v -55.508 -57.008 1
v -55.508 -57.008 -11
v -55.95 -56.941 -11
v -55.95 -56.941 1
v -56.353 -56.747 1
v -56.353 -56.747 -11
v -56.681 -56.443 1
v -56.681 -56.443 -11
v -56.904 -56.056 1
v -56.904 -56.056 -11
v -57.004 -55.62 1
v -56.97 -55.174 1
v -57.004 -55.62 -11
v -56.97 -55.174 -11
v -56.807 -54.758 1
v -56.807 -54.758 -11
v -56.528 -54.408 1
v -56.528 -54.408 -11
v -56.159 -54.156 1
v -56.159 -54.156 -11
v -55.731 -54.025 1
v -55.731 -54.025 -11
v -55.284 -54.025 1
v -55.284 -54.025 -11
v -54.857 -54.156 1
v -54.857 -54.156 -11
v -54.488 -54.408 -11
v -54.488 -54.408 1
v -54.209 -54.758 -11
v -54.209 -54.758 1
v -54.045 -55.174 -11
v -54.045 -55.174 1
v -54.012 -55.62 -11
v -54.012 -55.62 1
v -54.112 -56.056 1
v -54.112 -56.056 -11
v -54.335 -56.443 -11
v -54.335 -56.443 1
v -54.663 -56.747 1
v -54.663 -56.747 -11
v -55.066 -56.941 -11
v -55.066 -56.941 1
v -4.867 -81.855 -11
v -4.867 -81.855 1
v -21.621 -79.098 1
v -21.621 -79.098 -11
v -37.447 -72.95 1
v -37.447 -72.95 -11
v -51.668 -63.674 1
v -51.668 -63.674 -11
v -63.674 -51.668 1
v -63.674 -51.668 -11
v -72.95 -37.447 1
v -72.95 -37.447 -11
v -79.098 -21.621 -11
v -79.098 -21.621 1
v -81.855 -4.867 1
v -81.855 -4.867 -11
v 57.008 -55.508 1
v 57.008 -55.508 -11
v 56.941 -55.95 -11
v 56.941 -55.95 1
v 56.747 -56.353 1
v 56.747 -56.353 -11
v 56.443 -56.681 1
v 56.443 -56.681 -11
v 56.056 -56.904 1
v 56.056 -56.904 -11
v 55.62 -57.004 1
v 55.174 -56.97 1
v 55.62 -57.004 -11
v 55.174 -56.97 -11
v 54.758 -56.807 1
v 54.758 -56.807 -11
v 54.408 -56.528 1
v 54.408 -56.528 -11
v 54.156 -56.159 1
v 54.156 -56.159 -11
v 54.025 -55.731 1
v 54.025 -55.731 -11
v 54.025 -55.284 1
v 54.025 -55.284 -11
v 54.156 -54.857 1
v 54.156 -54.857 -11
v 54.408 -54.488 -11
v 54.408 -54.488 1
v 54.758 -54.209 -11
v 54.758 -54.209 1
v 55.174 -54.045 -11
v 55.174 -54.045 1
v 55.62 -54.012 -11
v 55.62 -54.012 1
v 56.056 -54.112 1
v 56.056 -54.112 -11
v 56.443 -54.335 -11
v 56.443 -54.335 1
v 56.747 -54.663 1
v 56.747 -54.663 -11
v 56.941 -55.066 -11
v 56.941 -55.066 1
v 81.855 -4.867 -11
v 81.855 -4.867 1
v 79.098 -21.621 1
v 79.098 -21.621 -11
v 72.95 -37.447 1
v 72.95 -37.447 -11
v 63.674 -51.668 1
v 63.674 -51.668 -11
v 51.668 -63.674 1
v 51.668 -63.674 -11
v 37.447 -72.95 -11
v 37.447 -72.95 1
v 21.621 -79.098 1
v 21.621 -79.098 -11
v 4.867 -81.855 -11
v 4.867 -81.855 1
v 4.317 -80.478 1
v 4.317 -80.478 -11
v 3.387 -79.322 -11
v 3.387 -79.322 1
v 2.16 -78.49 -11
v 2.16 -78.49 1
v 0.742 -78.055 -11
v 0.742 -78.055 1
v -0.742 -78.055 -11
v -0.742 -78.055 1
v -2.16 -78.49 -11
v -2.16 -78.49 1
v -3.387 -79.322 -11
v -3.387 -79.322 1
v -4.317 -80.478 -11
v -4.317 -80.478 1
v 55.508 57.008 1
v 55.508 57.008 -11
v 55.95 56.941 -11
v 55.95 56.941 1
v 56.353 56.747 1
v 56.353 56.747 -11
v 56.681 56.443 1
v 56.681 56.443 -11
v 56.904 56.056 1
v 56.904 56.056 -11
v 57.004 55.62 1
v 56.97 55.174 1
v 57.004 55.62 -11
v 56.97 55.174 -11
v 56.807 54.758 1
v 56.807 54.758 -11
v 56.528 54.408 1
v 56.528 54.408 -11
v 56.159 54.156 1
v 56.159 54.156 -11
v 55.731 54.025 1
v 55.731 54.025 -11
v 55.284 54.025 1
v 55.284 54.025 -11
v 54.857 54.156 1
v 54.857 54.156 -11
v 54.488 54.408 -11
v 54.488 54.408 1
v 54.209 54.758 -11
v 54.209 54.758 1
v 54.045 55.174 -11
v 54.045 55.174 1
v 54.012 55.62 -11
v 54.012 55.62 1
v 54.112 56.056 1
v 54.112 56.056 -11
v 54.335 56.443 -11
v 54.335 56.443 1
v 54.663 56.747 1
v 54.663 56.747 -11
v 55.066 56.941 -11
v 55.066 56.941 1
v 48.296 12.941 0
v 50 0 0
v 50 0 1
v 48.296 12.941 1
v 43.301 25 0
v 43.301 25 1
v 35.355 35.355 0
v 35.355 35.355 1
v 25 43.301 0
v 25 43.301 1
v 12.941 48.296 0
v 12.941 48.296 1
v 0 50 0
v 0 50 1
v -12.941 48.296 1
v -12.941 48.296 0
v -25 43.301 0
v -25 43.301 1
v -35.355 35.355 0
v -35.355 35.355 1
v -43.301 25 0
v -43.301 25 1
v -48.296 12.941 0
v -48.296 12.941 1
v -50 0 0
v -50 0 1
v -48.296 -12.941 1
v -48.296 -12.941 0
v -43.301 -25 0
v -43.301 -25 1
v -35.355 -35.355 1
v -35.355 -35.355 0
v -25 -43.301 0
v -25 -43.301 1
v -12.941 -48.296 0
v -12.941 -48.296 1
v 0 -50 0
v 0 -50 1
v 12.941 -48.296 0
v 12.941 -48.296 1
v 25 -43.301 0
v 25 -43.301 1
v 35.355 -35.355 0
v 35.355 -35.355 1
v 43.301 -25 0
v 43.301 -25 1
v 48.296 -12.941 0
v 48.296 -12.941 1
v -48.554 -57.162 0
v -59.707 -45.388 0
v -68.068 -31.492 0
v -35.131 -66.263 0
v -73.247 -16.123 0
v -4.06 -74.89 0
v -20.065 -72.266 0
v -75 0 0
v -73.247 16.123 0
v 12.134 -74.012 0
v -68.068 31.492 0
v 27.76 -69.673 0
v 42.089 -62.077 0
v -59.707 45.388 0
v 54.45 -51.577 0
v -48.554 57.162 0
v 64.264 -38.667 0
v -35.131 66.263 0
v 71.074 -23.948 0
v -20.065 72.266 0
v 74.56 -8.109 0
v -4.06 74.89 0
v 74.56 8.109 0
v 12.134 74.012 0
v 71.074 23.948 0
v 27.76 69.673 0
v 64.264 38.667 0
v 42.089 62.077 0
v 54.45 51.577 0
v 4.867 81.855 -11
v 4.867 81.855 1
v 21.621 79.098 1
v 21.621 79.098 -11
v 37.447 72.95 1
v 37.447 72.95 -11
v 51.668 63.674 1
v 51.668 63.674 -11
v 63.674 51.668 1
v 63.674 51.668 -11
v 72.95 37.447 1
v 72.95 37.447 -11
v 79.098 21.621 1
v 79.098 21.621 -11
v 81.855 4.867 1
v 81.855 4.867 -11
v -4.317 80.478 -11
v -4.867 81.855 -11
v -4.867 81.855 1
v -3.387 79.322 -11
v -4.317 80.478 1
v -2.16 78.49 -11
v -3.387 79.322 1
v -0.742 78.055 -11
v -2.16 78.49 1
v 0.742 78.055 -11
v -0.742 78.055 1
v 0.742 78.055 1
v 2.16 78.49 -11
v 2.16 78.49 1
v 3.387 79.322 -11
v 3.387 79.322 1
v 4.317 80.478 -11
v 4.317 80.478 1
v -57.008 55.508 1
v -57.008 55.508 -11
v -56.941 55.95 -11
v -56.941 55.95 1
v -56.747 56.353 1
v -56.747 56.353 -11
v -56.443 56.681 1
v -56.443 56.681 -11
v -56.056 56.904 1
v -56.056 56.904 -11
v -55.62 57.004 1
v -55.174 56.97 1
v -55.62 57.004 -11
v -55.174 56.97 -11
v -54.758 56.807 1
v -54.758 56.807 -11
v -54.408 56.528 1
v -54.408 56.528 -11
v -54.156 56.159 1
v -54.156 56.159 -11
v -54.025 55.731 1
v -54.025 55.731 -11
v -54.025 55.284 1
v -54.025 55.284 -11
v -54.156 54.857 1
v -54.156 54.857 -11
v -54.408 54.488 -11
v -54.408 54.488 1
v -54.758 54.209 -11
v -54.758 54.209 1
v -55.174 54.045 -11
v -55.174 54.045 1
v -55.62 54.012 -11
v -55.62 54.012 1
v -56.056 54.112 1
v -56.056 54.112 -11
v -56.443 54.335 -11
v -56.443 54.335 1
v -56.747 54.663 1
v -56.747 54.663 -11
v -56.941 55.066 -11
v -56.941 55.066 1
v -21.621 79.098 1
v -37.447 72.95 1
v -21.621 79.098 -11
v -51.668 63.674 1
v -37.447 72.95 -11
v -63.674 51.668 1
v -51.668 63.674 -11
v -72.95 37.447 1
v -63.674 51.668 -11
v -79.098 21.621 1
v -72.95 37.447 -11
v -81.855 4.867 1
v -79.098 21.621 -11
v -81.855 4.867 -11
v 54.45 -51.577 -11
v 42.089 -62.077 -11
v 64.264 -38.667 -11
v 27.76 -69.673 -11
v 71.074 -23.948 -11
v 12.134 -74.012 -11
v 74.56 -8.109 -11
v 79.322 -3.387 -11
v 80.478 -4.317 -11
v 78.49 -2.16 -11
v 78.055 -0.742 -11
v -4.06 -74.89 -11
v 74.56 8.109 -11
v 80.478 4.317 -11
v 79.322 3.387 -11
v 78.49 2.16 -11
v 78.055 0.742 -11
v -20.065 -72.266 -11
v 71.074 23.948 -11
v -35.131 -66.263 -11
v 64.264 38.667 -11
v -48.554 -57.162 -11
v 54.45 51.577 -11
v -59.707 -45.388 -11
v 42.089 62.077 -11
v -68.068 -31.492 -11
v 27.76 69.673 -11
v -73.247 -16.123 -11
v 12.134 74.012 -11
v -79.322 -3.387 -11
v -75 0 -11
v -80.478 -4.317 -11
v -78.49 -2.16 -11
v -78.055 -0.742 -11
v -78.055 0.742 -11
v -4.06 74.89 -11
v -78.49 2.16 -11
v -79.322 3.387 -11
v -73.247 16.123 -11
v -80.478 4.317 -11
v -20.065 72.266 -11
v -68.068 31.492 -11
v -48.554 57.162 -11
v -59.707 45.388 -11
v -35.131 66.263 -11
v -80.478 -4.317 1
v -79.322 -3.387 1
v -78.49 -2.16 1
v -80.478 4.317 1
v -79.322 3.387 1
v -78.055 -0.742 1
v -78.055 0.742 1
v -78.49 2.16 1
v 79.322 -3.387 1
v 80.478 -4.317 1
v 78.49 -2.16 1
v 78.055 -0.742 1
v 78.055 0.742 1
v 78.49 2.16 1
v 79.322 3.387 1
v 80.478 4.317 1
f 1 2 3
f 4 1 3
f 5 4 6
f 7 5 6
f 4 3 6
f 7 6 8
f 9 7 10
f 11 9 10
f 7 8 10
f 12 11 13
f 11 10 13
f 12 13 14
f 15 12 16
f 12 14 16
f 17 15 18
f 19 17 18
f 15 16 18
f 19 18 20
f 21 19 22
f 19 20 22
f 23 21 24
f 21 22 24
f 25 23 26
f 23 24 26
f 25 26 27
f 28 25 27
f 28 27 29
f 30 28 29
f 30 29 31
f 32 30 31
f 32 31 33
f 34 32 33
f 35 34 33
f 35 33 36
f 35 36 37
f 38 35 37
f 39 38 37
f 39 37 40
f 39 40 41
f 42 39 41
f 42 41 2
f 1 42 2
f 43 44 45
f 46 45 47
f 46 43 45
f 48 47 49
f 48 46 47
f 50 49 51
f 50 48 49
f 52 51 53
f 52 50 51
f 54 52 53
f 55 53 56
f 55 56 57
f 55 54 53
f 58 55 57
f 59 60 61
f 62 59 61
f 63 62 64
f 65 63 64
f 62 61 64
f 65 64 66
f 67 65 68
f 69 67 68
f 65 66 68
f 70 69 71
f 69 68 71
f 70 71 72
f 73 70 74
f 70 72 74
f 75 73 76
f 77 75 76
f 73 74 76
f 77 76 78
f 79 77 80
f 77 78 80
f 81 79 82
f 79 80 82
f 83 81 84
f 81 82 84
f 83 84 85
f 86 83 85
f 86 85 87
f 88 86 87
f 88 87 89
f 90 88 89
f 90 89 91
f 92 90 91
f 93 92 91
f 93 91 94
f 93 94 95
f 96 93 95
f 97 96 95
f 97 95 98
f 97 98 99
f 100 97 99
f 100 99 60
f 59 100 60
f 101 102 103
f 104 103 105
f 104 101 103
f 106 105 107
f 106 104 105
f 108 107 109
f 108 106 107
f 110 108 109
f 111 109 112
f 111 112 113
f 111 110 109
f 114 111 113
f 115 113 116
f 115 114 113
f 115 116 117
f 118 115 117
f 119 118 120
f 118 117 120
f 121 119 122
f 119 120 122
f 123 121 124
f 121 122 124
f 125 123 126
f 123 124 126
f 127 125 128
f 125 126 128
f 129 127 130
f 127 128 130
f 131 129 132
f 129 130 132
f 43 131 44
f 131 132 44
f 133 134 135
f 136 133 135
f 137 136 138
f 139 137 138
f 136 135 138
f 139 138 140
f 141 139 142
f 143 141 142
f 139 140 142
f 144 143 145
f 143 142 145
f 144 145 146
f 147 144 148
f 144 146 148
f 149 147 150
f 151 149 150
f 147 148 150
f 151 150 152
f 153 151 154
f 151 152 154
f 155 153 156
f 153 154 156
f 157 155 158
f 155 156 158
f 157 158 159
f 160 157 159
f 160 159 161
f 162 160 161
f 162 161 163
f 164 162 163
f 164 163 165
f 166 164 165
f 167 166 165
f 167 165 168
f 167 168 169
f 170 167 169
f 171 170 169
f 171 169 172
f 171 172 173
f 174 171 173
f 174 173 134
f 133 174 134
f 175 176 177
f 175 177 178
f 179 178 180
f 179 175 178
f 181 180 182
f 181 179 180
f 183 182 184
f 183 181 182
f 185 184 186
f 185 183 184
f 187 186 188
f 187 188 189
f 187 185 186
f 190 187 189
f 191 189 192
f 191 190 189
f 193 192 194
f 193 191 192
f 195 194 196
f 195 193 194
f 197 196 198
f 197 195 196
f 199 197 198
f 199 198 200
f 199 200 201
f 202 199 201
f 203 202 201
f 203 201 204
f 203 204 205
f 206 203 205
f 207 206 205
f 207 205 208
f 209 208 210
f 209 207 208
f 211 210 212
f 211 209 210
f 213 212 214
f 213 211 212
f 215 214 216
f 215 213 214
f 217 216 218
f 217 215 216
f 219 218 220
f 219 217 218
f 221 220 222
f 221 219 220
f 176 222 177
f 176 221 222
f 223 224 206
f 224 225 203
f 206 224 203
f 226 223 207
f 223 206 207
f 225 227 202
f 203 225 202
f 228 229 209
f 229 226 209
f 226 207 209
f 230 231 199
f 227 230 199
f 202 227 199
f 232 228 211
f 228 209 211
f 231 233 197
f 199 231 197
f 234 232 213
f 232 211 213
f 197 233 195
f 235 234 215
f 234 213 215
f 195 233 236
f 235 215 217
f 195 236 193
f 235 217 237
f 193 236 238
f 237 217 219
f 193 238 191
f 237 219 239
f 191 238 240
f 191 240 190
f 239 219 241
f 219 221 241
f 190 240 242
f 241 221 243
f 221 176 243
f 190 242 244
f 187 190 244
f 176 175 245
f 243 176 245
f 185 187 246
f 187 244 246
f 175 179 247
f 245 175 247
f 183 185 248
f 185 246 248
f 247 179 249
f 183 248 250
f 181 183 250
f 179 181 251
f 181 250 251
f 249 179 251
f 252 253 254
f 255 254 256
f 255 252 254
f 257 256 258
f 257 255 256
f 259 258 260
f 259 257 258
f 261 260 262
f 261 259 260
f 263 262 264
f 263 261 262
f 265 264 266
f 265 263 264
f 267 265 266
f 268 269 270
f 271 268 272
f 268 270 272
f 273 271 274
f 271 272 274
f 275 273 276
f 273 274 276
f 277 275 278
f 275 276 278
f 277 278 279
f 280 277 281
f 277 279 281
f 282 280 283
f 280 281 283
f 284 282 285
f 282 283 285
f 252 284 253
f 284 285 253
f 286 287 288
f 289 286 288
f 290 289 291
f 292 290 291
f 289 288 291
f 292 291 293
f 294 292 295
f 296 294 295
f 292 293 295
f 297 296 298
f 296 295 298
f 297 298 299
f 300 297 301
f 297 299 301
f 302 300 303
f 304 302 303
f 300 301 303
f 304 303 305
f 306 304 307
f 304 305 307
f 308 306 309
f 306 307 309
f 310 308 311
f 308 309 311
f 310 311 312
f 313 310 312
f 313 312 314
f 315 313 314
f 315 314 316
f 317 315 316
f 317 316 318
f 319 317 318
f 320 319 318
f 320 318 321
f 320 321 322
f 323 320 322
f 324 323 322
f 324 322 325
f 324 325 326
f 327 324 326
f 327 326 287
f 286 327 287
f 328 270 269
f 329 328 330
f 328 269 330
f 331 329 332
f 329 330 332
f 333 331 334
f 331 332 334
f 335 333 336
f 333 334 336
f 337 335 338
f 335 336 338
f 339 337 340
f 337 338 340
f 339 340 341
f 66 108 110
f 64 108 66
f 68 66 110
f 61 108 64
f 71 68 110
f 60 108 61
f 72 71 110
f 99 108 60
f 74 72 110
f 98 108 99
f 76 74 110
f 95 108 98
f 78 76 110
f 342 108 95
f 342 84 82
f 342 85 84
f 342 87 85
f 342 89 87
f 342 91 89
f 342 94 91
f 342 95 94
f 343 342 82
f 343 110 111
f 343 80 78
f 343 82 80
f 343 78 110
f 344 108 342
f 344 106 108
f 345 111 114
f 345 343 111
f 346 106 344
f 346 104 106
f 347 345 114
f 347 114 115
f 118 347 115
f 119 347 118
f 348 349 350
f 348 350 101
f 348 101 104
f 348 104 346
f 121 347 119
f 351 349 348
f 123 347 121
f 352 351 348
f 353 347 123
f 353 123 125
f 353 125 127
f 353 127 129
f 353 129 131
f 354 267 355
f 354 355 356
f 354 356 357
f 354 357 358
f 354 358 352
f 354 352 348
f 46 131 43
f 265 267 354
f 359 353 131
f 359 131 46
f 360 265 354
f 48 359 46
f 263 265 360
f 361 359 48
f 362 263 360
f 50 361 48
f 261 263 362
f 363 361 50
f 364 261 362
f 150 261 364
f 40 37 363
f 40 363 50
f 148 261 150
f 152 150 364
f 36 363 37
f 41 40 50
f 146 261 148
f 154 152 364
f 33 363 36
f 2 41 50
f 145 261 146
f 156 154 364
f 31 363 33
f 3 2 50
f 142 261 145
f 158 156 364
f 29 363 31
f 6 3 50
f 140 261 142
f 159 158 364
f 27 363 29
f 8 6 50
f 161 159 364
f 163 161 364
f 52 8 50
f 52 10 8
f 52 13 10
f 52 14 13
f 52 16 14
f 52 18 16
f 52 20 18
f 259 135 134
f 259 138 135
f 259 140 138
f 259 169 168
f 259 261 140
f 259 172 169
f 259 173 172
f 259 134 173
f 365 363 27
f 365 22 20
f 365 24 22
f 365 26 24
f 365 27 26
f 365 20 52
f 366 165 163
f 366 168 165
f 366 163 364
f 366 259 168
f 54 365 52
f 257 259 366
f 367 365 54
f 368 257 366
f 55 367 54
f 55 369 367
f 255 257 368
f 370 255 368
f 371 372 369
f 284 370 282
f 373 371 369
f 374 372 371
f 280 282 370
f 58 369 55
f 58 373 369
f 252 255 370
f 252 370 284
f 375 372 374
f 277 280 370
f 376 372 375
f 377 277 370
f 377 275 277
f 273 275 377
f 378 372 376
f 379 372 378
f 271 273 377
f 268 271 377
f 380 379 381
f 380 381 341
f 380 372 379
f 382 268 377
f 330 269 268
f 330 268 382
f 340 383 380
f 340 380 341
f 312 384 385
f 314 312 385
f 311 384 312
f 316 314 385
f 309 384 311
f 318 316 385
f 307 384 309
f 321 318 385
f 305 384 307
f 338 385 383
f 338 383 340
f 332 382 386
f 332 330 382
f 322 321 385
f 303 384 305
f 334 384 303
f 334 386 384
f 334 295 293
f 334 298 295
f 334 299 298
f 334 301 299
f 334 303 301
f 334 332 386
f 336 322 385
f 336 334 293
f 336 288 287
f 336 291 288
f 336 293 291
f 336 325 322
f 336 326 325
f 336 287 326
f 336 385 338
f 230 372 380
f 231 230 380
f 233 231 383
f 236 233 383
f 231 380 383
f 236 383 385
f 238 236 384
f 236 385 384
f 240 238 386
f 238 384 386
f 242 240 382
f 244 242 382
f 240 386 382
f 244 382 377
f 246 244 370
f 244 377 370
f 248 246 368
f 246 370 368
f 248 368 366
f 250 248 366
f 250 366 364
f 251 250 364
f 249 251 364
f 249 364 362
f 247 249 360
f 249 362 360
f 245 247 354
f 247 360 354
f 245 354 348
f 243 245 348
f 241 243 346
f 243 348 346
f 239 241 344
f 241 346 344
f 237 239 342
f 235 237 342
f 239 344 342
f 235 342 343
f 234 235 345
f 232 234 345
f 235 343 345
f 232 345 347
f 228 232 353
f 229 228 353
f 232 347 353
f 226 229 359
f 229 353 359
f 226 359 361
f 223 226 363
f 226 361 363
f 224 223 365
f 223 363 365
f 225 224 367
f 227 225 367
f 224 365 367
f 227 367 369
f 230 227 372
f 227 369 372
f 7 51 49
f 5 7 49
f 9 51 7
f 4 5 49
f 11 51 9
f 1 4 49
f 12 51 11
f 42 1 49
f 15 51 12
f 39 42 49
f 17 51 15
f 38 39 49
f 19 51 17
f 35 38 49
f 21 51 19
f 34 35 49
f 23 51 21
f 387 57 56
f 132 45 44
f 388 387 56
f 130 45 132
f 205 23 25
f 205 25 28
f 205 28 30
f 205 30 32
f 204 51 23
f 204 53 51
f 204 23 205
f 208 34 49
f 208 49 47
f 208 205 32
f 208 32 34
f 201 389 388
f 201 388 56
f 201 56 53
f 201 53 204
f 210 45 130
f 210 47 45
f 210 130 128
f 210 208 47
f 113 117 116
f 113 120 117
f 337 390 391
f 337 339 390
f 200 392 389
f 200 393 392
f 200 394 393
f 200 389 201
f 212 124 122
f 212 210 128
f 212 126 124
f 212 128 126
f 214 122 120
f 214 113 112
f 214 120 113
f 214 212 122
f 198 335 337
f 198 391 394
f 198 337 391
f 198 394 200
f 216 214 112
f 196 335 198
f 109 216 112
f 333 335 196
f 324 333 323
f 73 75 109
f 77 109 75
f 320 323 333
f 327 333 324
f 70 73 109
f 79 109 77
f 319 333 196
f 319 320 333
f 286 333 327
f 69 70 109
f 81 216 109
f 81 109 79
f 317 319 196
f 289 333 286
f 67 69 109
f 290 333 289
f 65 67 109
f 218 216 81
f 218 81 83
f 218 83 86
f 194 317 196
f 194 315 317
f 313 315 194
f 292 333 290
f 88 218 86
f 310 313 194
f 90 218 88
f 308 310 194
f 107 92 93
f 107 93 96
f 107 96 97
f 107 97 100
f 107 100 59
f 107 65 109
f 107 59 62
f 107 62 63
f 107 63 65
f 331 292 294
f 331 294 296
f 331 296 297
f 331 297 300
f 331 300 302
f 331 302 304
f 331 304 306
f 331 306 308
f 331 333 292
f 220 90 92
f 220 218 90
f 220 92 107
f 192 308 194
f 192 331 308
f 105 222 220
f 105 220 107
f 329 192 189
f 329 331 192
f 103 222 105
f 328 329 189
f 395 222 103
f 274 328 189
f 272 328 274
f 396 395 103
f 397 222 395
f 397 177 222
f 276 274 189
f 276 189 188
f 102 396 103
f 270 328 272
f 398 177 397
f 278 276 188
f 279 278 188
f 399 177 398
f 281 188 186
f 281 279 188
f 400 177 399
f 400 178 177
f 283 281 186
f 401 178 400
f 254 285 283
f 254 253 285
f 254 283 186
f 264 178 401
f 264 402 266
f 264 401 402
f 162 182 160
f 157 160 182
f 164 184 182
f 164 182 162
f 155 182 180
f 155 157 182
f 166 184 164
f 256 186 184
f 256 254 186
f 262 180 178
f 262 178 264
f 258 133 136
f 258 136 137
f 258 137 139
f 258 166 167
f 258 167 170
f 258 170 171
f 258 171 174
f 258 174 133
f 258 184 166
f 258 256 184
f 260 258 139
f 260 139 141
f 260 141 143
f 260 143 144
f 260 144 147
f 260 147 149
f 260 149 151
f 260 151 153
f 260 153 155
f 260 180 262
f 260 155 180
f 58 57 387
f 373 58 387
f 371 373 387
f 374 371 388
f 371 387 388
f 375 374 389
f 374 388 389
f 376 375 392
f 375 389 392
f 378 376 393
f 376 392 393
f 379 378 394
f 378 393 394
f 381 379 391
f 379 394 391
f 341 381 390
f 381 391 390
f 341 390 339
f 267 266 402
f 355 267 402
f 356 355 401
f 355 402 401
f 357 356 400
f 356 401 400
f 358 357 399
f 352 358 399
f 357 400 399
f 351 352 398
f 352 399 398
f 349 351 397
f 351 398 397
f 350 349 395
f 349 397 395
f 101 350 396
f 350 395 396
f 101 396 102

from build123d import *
from build123d.topology import SkipClean

# Parameters (mm, degrees)
SKETCH1_R           = 82
SKETCH1_R_2         = 50
BOSS_EXTRUDE1_DEPTH = 1
BOSS_EXTRUDE3_START = 11
SKETCH3_R           = 82
SKETCH3_R_2         = 75
BOSS_EXTRUDE3_DEPTH = 11
SKETCH4_R           = 5
CUT_EXTRUDE1_DEPTH  = 117.584733134
CIRPATTERN1_COUNT   = 4
SKETCH5_R           = 1.5
CUT_EXTRUDE2_DEPTH  = 117.381356407
CIRPATTERN2_COUNT   = 4


with BuildPart() as part:
    # Sketch1 → Boss-Extrude1 (new body)
    with BuildSketch(Plane.XY):
        Circle(SKETCH1_R)
        Circle(SKETCH1_R_2, mode=Mode.SUBTRACT)
    extrude(amount=BOSS_EXTRUDE1_DEPTH)

    # Sketch3 → Boss-Extrude3 (add)
    with BuildSketch(Plane(origin=(0, 0, 0), x_dir=(-1, 0, 0), z_dir=(0, 0, -1)).offset(BOSS_EXTRUDE3_START)):
        Circle(SKETCH3_R)
        Circle(SKETCH3_R_2, mode=Mode.SUBTRACT)
    extrude(amount=-BOSS_EXTRUDE3_DEPTH)

    # Sketch4 → Cut-Extrude1 (cut, through all)
    with SkipClean():  # the faces are left unmerged after this step: merging them gives an invalid solid
        with BuildSketch(Plane.XY.offset(1)):
            with Locations((0, 83)):
                Circle(SKETCH4_R)
        cut_extrude1 = extrude(amount=-CUT_EXTRUDE1_DEPTH, mode=Mode.SUBTRACT)

    # CirPattern1: Cut-Extrude1 ×4 about axis
    cirpattern1_axis = Axis((0, 0, 0), (0, 0, 1))
    for i in range(1, CIRPATTERN1_COUNT):
        add(cut_extrude1.rotate(cirpattern1_axis, i * 360 / CIRPATTERN1_COUNT), mode=Mode.SUBTRACT)

    # Sketch5 → Cut-Extrude2 (cut, through all)
    with BuildSketch(Plane(origin=(0, 0, -11), x_dir=(-1, 0, 0), z_dir=(0, 0, -1))):
        with Locations((55.507882323, 55.507882323)):
            Circle(SKETCH5_R)
    cut_extrude2 = extrude(amount=-CUT_EXTRUDE2_DEPTH, mode=Mode.SUBTRACT)

    # CirPattern2: Cut-Extrude2 ×4 about axis
    cirpattern2_axis = Axis((0, 0, 0), (0, 0, 1))
    for i in range(1, CIRPATTERN2_COUNT):
        add(cut_extrude2.rotate(cirpattern2_axis, i * 360 / CIRPATTERN2_COUNT), mode=Mode.SUBTRACT)


solid = part.part
